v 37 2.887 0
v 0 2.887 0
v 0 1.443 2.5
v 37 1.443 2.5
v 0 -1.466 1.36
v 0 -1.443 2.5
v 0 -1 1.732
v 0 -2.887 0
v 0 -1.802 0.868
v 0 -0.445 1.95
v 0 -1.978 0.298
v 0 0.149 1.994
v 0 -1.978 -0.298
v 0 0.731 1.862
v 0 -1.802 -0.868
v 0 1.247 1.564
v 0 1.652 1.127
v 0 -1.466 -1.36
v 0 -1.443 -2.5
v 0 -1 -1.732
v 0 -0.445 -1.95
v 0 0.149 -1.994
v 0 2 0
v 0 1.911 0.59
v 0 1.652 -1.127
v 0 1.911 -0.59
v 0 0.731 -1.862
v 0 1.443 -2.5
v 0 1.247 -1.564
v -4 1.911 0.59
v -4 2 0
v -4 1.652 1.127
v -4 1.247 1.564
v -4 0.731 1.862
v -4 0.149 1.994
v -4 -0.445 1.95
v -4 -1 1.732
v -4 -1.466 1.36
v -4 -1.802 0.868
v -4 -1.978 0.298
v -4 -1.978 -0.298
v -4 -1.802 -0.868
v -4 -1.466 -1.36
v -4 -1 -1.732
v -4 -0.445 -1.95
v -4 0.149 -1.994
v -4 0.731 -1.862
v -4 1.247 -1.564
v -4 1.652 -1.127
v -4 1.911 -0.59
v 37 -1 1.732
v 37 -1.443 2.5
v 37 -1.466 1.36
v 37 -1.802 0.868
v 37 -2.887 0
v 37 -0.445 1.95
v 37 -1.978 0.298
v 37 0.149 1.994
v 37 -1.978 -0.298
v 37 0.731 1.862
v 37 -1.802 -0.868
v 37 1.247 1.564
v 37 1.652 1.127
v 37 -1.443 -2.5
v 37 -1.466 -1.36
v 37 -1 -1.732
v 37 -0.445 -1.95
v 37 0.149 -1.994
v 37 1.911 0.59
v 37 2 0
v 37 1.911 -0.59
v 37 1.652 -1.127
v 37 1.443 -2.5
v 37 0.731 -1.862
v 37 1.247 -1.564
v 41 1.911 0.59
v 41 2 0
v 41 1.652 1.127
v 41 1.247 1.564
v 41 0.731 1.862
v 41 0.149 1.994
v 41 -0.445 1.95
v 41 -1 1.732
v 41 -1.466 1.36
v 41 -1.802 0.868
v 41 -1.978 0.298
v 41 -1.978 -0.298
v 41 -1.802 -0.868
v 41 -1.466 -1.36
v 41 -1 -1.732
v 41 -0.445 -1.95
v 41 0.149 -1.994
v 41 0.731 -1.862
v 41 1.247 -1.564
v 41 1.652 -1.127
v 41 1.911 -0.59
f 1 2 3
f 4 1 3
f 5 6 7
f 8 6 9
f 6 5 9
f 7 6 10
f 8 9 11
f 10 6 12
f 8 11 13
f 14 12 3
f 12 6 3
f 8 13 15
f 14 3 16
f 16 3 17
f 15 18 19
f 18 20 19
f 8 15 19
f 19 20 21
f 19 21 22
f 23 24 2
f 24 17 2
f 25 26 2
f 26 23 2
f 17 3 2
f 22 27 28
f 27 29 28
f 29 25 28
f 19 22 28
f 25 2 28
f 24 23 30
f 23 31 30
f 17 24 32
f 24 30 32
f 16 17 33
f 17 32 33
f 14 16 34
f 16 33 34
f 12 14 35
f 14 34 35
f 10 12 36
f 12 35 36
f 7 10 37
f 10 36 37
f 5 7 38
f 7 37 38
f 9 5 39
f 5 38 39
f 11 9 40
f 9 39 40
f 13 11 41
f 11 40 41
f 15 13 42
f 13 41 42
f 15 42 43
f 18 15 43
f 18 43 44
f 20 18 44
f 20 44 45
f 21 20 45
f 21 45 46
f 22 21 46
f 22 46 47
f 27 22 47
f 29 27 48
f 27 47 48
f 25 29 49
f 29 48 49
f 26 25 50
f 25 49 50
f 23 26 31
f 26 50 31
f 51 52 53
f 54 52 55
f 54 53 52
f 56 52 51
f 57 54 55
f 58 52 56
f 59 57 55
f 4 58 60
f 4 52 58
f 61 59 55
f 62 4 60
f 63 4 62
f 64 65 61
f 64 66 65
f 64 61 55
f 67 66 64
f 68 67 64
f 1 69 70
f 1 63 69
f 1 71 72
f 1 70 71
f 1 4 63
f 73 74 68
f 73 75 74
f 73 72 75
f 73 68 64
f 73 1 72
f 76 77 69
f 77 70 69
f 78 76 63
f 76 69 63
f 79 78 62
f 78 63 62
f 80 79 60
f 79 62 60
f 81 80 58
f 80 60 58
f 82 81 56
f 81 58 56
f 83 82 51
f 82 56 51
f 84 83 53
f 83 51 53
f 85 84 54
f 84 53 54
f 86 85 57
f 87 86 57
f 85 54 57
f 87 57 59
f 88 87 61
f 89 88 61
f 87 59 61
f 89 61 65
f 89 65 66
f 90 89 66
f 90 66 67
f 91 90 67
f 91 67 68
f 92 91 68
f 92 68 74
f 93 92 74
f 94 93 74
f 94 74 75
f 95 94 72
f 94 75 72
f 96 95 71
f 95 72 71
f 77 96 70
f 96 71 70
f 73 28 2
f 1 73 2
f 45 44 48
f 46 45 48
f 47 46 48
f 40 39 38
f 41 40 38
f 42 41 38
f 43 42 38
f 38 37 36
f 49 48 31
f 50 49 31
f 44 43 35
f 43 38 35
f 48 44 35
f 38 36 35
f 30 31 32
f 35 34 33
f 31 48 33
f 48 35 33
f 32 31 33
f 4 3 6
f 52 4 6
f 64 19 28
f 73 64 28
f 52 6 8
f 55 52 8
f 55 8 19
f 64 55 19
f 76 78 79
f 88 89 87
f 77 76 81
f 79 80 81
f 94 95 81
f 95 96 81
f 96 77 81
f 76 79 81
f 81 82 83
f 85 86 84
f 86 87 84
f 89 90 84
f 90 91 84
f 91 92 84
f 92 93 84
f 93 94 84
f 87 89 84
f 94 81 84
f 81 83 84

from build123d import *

# Parameters (mm, degrees)
BOSS_EXTRUDE1_DEPTH = 37


with BuildPart() as part:
    # Sketch1 → Revolve1 (revolve)
    with BuildSketch(Plane.XY):
        Polygon((0, 2), (-4, 2), (-4, 0), (41, 0), (41, 2), (37, 2), (37, 2.5), (0, 2.5), align=None)
    revolve(axis=Axis((-6.185185185, 0, 0), (1, 0, 0)))

    # Sketch2 → Boss-Extrude1 (add)
    with BuildSketch(Plane(origin=(0, 0, 0), x_dir=(0, 0, -1), z_dir=(1, 0, 0))):
        Polygon((0, 2.886751346), (-2.5, 1.443375673), (-2.5, -1.443375673), (0, -2.886751346), (2.5, -1.443375673), (2.5, 1.443375673), align=None)
    extrude(amount=BOSS_EXTRUDE1_DEPTH)


solid = part.part
